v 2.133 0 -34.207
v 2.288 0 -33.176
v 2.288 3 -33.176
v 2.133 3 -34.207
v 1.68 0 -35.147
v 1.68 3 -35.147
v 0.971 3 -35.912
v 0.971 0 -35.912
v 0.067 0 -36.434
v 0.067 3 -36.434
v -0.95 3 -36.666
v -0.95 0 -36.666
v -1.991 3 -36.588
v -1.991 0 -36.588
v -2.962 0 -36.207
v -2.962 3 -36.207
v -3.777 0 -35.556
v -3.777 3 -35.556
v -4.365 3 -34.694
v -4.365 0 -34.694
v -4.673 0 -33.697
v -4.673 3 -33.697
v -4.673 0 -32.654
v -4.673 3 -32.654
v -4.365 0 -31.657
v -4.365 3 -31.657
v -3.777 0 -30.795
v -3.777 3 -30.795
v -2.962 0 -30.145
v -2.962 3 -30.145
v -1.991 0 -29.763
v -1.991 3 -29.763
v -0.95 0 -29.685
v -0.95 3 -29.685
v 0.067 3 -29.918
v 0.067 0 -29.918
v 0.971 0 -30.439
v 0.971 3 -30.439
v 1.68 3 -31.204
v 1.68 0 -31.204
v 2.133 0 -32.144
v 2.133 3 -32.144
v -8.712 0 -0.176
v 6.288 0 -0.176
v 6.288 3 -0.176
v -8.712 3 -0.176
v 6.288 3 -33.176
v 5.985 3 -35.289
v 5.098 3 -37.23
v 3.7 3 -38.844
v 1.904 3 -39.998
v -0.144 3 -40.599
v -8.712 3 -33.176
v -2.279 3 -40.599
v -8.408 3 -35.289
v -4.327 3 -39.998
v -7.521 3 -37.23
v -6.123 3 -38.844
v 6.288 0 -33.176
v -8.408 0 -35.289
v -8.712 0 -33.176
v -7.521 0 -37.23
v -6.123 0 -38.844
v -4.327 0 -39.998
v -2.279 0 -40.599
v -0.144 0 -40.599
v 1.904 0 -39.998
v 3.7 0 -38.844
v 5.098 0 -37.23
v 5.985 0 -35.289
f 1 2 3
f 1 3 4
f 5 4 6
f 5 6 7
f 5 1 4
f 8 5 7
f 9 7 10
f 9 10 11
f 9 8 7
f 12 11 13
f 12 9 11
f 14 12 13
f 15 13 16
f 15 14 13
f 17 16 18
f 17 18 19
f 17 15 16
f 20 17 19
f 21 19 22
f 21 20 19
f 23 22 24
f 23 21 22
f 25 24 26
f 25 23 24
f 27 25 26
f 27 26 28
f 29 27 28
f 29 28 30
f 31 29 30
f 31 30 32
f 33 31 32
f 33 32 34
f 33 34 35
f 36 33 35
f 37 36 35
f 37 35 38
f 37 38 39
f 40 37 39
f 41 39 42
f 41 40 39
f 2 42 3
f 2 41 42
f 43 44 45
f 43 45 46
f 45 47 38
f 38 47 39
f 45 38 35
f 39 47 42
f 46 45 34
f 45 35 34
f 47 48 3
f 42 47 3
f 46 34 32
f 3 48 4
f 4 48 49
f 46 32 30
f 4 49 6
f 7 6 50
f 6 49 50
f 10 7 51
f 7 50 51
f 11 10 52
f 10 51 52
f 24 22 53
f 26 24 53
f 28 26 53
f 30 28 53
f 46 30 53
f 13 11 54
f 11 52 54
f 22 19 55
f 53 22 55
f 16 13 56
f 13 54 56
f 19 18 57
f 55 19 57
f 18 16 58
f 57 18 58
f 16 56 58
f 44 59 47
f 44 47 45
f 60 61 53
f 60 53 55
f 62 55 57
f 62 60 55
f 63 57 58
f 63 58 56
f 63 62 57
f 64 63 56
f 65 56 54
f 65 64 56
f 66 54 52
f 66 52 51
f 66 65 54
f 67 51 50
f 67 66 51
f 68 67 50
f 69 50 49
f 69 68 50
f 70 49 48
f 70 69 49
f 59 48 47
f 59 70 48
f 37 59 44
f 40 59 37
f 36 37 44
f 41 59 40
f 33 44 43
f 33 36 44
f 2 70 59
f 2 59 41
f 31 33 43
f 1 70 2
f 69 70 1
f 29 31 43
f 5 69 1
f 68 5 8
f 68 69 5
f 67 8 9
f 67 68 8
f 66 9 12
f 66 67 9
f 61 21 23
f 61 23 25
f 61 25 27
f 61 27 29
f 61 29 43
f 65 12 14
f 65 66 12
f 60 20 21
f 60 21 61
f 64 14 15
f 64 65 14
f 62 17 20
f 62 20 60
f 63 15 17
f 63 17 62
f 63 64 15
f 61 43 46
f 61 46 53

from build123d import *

# Parameters (mm, degrees)
SKETCH1_R           = 3.5
BOSS_EXTRUDE1_DEPTH = 3


with BuildPart() as part:
    # Sketch1 → Boss-Extrude1 (new body)
    with BuildSketch(Plane(origin=(0, 0, 0), x_dir=(1, 0, 0), z_dir=(0, 1, 0))):
        with BuildLine():
            Line((-8.711687898, 0.175603251), (-8.711687898, 33.175603251))
            ThreePointArc((-8.711687898, 33.175603251), (-1.211687898, 40.675603251), (6.288312102, 33.175603251))
            Line((6.288312102, 33.175603251), (6.288312102, 0.175603251))
            Line((6.288312102, 0.175603251), (-8.711687898, 0.175603251))
        make_face()
        with Locations((-1.211687898, 33.175603251)):
            Circle(SKETCH1_R, mode=Mode.SUBTRACT)
    extrude(amount=BOSS_EXTRUDE1_DEPTH)


solid = part.part
